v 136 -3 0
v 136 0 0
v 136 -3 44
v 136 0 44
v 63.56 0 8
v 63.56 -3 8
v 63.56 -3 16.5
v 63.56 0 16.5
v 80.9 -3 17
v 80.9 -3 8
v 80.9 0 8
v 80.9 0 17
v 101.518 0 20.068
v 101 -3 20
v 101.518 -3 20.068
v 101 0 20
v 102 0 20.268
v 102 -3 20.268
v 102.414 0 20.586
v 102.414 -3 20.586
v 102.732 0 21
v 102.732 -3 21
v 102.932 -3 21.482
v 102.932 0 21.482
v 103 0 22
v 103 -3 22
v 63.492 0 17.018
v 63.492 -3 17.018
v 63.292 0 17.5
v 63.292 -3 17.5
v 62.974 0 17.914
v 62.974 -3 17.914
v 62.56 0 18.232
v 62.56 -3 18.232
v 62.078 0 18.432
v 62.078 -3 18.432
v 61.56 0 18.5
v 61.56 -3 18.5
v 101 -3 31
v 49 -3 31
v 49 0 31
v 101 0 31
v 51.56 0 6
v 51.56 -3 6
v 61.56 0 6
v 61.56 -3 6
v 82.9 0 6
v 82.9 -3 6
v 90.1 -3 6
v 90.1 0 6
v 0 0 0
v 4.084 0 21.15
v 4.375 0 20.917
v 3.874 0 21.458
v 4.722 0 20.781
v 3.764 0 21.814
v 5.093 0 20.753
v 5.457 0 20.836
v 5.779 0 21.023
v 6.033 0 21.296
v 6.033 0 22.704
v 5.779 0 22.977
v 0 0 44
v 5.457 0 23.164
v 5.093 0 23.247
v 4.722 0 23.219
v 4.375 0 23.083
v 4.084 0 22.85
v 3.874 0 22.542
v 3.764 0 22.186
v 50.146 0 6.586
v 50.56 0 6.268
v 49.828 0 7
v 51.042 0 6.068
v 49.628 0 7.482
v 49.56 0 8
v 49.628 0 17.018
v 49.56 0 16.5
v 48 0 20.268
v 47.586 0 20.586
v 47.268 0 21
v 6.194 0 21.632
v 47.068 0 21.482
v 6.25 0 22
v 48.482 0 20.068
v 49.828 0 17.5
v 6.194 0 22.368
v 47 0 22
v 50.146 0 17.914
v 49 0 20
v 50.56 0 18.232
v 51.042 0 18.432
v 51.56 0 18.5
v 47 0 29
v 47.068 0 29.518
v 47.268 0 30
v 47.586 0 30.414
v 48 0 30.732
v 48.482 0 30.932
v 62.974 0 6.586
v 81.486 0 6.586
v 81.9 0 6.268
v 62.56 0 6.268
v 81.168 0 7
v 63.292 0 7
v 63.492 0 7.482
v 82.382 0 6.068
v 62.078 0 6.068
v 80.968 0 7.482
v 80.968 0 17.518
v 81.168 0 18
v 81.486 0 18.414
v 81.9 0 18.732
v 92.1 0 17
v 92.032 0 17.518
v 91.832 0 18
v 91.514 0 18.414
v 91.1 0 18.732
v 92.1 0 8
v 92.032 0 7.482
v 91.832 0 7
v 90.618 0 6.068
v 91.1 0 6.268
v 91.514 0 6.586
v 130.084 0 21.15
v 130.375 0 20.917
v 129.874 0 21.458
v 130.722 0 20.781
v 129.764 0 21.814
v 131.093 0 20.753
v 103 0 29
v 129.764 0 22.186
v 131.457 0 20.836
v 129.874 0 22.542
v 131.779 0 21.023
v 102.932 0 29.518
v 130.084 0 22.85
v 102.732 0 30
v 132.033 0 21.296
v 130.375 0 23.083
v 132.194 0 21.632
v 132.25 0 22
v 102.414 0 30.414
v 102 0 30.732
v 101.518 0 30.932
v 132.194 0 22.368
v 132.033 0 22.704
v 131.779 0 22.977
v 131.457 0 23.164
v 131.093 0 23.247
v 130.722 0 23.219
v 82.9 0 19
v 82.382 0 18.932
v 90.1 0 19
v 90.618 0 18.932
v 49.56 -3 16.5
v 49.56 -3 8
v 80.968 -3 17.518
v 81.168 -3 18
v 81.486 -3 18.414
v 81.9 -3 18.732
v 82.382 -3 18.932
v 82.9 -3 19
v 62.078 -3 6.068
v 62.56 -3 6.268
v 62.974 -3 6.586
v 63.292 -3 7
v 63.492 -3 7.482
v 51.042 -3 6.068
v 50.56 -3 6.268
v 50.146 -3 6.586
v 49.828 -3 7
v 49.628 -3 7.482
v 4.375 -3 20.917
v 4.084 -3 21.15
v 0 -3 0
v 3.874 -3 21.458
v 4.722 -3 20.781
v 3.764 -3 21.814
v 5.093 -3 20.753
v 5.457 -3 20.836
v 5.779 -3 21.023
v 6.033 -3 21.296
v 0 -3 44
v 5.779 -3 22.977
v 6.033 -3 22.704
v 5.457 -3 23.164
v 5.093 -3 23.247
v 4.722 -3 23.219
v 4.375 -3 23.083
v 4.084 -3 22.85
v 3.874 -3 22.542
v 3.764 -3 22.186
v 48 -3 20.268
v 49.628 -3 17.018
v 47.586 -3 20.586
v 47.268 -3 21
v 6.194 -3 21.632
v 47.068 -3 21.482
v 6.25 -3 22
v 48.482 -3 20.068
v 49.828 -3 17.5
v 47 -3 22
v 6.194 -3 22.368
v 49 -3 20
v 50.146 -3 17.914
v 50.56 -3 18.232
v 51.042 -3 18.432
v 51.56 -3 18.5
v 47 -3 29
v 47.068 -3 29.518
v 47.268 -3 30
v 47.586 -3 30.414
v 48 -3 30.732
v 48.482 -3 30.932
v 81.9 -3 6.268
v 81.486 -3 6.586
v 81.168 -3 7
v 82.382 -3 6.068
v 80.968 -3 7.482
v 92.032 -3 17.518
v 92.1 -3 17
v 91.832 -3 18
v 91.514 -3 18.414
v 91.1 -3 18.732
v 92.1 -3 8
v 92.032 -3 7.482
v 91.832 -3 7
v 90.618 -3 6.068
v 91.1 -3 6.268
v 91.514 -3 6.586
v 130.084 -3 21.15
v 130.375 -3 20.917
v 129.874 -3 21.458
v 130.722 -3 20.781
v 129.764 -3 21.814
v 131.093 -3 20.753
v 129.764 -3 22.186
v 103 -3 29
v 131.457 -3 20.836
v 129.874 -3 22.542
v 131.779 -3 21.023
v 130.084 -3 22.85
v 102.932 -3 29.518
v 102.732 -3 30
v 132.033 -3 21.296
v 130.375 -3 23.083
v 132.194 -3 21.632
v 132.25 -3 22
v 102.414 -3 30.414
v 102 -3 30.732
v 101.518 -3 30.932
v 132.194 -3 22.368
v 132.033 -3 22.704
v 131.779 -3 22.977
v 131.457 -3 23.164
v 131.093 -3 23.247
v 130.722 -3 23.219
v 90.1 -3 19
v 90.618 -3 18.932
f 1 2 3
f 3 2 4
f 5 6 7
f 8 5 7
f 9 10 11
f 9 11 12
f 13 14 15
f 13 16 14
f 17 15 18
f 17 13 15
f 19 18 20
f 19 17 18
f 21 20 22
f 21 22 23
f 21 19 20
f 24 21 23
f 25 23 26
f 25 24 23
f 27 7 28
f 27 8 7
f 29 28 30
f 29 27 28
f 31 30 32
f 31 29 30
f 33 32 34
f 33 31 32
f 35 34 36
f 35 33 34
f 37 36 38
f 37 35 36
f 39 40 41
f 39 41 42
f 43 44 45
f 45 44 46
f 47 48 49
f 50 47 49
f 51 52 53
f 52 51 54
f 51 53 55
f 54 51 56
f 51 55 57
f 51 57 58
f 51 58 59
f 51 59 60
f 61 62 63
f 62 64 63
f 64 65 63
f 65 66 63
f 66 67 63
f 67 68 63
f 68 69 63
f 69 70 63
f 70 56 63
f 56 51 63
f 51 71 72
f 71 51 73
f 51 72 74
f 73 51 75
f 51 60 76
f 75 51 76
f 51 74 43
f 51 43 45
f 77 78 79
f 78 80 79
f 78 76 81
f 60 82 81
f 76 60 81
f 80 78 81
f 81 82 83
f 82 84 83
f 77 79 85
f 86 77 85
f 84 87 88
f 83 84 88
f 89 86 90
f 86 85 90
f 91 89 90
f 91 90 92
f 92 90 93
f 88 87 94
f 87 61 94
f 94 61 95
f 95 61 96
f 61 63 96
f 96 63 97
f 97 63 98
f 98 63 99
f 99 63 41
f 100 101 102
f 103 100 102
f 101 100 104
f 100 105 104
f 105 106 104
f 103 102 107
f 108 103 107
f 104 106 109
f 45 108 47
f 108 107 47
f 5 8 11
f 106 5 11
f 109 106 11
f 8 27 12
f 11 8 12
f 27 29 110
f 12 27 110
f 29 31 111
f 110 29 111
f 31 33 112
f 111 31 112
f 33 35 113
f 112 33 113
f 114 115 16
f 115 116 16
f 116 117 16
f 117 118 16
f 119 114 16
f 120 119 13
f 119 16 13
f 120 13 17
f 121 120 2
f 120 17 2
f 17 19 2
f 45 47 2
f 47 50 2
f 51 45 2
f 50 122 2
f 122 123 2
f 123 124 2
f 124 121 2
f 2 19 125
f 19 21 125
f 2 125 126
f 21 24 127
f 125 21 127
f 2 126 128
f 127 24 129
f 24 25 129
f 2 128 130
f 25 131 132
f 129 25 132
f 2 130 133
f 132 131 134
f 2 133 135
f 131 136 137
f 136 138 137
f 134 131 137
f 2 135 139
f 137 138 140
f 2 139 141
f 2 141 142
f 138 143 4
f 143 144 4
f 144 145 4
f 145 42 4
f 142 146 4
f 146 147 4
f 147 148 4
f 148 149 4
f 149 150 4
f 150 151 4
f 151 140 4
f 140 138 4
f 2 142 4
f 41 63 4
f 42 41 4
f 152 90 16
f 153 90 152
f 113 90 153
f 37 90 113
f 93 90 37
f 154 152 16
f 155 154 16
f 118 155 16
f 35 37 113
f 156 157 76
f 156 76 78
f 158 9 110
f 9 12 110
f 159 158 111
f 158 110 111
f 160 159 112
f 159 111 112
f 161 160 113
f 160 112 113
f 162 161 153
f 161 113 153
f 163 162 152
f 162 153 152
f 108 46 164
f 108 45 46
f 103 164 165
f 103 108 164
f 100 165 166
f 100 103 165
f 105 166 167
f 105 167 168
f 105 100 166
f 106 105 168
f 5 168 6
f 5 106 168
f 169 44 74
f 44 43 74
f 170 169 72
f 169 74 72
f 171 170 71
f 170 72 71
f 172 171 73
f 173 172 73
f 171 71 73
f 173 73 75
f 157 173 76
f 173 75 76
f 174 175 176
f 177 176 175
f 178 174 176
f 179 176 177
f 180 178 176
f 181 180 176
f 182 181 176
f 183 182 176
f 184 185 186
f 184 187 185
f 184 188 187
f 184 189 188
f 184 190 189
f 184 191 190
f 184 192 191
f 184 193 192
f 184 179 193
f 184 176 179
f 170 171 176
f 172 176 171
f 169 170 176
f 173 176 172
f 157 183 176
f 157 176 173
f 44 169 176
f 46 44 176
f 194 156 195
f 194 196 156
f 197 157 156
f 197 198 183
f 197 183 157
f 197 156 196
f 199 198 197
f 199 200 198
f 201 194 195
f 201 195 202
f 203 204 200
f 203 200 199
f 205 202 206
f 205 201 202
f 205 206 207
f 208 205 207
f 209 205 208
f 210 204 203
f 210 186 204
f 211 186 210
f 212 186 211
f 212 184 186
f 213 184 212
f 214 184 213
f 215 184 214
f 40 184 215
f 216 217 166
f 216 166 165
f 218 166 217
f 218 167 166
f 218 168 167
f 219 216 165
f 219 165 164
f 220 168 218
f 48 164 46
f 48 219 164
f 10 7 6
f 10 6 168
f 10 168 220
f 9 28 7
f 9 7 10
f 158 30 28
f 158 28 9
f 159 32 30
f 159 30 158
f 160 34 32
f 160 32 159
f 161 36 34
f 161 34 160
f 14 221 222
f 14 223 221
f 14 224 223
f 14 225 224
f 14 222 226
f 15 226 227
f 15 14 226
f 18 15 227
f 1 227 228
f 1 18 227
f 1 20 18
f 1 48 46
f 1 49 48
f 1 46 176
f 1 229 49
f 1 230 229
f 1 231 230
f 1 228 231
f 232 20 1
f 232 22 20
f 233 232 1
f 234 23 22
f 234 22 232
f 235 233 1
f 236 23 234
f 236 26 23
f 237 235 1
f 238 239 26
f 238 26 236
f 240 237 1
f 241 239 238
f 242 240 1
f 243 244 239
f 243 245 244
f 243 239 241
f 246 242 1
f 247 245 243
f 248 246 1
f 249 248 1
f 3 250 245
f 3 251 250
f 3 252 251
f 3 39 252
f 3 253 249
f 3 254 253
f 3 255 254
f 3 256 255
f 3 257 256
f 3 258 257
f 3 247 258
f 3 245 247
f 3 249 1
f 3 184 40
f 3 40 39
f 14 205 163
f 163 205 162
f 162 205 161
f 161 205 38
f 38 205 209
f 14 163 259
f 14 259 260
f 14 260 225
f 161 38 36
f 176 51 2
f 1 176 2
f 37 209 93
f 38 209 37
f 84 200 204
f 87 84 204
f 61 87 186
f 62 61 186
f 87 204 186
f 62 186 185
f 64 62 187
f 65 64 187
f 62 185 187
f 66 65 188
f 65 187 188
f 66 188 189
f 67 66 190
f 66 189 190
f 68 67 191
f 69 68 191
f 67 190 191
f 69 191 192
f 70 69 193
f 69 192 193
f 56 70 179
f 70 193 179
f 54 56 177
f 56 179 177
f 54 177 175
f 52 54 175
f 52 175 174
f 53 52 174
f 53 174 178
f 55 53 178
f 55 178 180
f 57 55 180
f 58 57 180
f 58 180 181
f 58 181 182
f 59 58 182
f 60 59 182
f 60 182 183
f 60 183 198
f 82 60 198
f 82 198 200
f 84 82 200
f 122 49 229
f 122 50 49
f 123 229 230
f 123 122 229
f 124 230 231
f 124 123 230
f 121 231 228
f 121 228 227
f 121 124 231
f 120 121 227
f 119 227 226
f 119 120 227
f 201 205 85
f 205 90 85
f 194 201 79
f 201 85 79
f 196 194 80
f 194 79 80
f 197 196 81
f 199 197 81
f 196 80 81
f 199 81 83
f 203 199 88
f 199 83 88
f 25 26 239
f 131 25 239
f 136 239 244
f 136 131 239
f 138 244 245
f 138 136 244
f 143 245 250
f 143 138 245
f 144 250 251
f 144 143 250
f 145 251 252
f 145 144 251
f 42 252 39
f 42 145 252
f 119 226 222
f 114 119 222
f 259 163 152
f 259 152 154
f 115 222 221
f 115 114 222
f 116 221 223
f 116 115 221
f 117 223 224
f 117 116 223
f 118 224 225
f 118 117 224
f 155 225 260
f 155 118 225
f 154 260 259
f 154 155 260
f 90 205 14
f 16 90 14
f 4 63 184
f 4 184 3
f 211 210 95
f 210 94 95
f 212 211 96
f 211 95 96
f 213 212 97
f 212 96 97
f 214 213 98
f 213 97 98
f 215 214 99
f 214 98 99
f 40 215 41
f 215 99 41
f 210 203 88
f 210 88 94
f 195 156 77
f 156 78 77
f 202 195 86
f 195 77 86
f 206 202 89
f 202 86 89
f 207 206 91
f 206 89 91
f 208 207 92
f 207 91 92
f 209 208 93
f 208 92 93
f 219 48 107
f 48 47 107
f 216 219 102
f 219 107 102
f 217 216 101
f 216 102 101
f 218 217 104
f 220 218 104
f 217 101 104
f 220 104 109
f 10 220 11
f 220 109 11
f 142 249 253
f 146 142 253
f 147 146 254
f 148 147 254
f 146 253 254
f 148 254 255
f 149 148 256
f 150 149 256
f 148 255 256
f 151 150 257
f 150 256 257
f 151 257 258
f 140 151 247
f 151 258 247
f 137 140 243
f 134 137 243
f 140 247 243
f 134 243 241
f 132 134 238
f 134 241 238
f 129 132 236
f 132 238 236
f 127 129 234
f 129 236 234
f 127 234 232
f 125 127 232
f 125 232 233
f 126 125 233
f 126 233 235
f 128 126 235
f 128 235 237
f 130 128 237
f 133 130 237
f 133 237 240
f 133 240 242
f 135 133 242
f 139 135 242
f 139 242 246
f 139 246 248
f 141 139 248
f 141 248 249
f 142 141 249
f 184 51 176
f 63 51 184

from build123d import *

# Parameters (mm, degrees)
SKETCH_W        = 136
SKETCH_H        = 44
PAD_DEPTH       = 3
SKETCH001_W     = 14
SKETCH001_H     = 12.5
SKETCH001_W_2   = 56
SKETCH001_H_2   = 11
SKETCH001_W_3   = 11.2
SKETCH001_H_3   = 13
POCKET_DEPTH    = 3.001
SKETCH002_R     = 1.25
POCKET001_DEPTH = 3.001
FILLET_R        = 2


with BuildPart() as part:
    # Sketch → Pad (new body)
    with BuildSketch(Plane.XZ):
        with Locations((68, 22)):
            Rectangle(SKETCH_W, SKETCH_H)
    extrude(amount=PAD_DEPTH)

    # Sketch001 (on Face6 of Pad) → Pocket (cut, through all)
    with BuildSketch(Plane.XZ.offset(3)):
        with Locations((56.56, 12.25)):
            Rectangle(SKETCH001_W, SKETCH001_H)
        with Locations((75, 25.5)):
            Rectangle(SKETCH001_W_2, SKETCH001_H_2)
        with Locations((86.5, 12.5)):
            Rectangle(SKETCH001_W_3, SKETCH001_H_3)
    extrude(amount=-POCKET_DEPTH, mode=Mode.SUBTRACT)

    # Sketch002 (on Face5 of Pocket) → Pocket001 (cut, through all)
    with BuildSketch(Plane.XZ.offset(3)):
        with Locations((5, 22)):
            Circle(SKETCH002_R)
        with Locations((131, 22)):
            Circle(SKETCH002_R)
    extrude(amount=-POCKET001_DEPTH, mode=Mode.SUBTRACT)

    # Fillet
    fillet_edges = [part.edges().sort_by_distance(p)[0] for p in [
        (47, -1.5, 31),
        (47, -1.5, 20),
        (103, -1.5, 20),
        (103, -1.5, 31),
        (92.1, -1.5, 19),
        (80.9, -1.5, 19),
        (80.9, -1.5, 6),
        (92.1, -1.5, 6),
        (63.56, -1.5, 6),
        (49.56, -1.5, 6),
        (49.56, -1.5, 18.5),
        (63.56, -1.5, 18.5),
    ]]
    fillet(fillet_edges, radius=FILLET_R)


solid = part.part
